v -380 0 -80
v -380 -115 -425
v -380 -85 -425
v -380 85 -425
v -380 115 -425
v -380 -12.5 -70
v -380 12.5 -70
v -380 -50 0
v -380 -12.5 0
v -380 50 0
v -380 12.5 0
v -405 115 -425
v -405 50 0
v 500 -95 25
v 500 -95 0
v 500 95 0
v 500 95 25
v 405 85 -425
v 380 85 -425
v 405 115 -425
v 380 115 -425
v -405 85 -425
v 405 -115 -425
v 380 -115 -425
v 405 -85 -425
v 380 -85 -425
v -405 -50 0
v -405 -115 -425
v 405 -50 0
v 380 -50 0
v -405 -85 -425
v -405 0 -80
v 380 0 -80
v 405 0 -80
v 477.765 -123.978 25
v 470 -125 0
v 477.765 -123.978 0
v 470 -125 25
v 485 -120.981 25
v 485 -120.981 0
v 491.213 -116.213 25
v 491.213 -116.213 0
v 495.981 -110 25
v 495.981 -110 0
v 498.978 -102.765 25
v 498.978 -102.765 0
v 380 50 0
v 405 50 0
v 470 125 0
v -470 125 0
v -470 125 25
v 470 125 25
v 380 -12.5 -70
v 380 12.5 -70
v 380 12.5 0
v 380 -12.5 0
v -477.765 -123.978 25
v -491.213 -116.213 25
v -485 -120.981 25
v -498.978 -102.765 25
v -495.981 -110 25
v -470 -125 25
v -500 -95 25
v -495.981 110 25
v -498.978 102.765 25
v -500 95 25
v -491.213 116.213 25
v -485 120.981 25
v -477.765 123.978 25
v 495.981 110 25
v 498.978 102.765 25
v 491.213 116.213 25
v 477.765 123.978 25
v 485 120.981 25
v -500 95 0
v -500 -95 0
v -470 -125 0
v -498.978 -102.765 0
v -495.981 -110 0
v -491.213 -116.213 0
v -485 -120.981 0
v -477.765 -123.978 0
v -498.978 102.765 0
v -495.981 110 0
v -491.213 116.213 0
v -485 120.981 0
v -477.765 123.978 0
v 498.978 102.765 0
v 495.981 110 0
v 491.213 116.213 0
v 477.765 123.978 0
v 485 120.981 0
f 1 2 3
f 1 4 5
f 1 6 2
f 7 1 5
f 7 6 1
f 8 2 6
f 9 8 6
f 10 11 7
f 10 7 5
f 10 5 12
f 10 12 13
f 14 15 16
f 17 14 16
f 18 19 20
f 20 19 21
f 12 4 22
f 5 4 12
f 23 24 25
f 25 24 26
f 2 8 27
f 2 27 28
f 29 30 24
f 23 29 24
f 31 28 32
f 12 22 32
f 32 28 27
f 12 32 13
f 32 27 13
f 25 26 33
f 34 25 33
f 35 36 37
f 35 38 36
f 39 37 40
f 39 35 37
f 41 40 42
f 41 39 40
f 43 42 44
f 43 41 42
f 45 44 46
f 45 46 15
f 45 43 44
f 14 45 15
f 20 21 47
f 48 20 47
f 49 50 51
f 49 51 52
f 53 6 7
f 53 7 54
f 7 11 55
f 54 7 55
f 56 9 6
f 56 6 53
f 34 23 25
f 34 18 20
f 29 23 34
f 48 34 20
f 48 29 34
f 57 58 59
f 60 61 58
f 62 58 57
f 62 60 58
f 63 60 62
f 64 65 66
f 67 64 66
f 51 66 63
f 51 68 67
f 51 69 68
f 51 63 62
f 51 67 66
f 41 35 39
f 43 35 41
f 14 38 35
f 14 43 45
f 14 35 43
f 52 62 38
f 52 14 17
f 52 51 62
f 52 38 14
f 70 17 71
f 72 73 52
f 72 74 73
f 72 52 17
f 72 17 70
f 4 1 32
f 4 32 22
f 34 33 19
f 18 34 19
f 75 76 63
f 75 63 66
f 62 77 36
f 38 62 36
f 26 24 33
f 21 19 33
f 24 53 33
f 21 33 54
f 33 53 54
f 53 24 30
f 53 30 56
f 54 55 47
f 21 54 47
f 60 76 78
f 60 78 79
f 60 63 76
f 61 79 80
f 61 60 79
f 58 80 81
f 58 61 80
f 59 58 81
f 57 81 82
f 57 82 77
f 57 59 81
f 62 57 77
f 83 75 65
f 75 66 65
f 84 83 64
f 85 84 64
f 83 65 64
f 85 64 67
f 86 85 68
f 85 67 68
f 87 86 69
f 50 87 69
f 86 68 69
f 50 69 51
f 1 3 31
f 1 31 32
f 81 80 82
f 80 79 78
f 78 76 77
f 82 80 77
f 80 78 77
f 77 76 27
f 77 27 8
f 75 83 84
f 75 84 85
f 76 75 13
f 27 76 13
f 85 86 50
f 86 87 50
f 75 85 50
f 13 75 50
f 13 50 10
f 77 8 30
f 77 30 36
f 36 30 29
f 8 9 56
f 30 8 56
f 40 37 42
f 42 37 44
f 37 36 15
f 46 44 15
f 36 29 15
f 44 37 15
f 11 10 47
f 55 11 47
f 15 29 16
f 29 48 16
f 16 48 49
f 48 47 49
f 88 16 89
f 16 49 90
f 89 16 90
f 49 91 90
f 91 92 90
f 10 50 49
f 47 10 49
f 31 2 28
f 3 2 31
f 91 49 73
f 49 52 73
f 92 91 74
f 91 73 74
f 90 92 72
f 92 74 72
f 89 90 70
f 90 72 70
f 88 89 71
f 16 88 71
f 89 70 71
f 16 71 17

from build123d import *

# Parameters (mm, degrees)
F0_W     = 1000
F0_H     = 250
F1_DEPTH = 25
F2_W     = 380
F2_H     = 70
F3_DEPTH = 12.5
F5_START = 380
F5_DEPTH = 25
F6_START = -380
F6_DEPTH = 25
F7_R     = 30


with BuildPart() as f1:
    # F0 (on Top) → F1 (new body)
    with BuildSketch(Plane.XY):
        Rectangle(F0_W, F0_H)
    extrude(amount=F1_DEPTH)

    # F2 (on Front) → F3 (join, symmetric)
    with BuildSketch(Plane.XZ):
        with Locations((-190, -35)):
            Rectangle(F2_W, F2_H)
        with Locations((190, -35)):
            Rectangle(F2_W, F2_H)
    extrude(amount=F3_DEPTH, both=True)

    # F4 (on Right) → F5 (join)
    with BuildSketch(Plane.YZ.offset(F5_START)):
        Polygon((50, 0), (0, 0), (0, -80), (85, -425), (115, -425), align=None)
        Polygon((0, -80), (0, 0), (-50, 0), (-115, -425), (-85, -425), align=None)
    extrude(amount=F5_DEPTH)

    # F4 (on Right) → F6 (join)
    with BuildSketch(Plane.YZ.offset(F6_START)):
        Polygon((0, -80), (0, 0), (-50, 0), (-115, -425), (-85, -425), align=None)
        Polygon((50, 0), (0, 0), (0, -80), (85, -425), (115, -425), align=None)
    extrude(amount=-F6_DEPTH)

    # F7
    f7_edges = [f1.edges().sort_by_distance(p)[0] for p in [
        (500, 125, 12.5),
        (500, -125, 12.5),
        (-500, 125, 12.5),
        (-500, -125, 12.5),
    ]]
    fillet(f7_edges, radius=F7_R)


solid = f1.part
